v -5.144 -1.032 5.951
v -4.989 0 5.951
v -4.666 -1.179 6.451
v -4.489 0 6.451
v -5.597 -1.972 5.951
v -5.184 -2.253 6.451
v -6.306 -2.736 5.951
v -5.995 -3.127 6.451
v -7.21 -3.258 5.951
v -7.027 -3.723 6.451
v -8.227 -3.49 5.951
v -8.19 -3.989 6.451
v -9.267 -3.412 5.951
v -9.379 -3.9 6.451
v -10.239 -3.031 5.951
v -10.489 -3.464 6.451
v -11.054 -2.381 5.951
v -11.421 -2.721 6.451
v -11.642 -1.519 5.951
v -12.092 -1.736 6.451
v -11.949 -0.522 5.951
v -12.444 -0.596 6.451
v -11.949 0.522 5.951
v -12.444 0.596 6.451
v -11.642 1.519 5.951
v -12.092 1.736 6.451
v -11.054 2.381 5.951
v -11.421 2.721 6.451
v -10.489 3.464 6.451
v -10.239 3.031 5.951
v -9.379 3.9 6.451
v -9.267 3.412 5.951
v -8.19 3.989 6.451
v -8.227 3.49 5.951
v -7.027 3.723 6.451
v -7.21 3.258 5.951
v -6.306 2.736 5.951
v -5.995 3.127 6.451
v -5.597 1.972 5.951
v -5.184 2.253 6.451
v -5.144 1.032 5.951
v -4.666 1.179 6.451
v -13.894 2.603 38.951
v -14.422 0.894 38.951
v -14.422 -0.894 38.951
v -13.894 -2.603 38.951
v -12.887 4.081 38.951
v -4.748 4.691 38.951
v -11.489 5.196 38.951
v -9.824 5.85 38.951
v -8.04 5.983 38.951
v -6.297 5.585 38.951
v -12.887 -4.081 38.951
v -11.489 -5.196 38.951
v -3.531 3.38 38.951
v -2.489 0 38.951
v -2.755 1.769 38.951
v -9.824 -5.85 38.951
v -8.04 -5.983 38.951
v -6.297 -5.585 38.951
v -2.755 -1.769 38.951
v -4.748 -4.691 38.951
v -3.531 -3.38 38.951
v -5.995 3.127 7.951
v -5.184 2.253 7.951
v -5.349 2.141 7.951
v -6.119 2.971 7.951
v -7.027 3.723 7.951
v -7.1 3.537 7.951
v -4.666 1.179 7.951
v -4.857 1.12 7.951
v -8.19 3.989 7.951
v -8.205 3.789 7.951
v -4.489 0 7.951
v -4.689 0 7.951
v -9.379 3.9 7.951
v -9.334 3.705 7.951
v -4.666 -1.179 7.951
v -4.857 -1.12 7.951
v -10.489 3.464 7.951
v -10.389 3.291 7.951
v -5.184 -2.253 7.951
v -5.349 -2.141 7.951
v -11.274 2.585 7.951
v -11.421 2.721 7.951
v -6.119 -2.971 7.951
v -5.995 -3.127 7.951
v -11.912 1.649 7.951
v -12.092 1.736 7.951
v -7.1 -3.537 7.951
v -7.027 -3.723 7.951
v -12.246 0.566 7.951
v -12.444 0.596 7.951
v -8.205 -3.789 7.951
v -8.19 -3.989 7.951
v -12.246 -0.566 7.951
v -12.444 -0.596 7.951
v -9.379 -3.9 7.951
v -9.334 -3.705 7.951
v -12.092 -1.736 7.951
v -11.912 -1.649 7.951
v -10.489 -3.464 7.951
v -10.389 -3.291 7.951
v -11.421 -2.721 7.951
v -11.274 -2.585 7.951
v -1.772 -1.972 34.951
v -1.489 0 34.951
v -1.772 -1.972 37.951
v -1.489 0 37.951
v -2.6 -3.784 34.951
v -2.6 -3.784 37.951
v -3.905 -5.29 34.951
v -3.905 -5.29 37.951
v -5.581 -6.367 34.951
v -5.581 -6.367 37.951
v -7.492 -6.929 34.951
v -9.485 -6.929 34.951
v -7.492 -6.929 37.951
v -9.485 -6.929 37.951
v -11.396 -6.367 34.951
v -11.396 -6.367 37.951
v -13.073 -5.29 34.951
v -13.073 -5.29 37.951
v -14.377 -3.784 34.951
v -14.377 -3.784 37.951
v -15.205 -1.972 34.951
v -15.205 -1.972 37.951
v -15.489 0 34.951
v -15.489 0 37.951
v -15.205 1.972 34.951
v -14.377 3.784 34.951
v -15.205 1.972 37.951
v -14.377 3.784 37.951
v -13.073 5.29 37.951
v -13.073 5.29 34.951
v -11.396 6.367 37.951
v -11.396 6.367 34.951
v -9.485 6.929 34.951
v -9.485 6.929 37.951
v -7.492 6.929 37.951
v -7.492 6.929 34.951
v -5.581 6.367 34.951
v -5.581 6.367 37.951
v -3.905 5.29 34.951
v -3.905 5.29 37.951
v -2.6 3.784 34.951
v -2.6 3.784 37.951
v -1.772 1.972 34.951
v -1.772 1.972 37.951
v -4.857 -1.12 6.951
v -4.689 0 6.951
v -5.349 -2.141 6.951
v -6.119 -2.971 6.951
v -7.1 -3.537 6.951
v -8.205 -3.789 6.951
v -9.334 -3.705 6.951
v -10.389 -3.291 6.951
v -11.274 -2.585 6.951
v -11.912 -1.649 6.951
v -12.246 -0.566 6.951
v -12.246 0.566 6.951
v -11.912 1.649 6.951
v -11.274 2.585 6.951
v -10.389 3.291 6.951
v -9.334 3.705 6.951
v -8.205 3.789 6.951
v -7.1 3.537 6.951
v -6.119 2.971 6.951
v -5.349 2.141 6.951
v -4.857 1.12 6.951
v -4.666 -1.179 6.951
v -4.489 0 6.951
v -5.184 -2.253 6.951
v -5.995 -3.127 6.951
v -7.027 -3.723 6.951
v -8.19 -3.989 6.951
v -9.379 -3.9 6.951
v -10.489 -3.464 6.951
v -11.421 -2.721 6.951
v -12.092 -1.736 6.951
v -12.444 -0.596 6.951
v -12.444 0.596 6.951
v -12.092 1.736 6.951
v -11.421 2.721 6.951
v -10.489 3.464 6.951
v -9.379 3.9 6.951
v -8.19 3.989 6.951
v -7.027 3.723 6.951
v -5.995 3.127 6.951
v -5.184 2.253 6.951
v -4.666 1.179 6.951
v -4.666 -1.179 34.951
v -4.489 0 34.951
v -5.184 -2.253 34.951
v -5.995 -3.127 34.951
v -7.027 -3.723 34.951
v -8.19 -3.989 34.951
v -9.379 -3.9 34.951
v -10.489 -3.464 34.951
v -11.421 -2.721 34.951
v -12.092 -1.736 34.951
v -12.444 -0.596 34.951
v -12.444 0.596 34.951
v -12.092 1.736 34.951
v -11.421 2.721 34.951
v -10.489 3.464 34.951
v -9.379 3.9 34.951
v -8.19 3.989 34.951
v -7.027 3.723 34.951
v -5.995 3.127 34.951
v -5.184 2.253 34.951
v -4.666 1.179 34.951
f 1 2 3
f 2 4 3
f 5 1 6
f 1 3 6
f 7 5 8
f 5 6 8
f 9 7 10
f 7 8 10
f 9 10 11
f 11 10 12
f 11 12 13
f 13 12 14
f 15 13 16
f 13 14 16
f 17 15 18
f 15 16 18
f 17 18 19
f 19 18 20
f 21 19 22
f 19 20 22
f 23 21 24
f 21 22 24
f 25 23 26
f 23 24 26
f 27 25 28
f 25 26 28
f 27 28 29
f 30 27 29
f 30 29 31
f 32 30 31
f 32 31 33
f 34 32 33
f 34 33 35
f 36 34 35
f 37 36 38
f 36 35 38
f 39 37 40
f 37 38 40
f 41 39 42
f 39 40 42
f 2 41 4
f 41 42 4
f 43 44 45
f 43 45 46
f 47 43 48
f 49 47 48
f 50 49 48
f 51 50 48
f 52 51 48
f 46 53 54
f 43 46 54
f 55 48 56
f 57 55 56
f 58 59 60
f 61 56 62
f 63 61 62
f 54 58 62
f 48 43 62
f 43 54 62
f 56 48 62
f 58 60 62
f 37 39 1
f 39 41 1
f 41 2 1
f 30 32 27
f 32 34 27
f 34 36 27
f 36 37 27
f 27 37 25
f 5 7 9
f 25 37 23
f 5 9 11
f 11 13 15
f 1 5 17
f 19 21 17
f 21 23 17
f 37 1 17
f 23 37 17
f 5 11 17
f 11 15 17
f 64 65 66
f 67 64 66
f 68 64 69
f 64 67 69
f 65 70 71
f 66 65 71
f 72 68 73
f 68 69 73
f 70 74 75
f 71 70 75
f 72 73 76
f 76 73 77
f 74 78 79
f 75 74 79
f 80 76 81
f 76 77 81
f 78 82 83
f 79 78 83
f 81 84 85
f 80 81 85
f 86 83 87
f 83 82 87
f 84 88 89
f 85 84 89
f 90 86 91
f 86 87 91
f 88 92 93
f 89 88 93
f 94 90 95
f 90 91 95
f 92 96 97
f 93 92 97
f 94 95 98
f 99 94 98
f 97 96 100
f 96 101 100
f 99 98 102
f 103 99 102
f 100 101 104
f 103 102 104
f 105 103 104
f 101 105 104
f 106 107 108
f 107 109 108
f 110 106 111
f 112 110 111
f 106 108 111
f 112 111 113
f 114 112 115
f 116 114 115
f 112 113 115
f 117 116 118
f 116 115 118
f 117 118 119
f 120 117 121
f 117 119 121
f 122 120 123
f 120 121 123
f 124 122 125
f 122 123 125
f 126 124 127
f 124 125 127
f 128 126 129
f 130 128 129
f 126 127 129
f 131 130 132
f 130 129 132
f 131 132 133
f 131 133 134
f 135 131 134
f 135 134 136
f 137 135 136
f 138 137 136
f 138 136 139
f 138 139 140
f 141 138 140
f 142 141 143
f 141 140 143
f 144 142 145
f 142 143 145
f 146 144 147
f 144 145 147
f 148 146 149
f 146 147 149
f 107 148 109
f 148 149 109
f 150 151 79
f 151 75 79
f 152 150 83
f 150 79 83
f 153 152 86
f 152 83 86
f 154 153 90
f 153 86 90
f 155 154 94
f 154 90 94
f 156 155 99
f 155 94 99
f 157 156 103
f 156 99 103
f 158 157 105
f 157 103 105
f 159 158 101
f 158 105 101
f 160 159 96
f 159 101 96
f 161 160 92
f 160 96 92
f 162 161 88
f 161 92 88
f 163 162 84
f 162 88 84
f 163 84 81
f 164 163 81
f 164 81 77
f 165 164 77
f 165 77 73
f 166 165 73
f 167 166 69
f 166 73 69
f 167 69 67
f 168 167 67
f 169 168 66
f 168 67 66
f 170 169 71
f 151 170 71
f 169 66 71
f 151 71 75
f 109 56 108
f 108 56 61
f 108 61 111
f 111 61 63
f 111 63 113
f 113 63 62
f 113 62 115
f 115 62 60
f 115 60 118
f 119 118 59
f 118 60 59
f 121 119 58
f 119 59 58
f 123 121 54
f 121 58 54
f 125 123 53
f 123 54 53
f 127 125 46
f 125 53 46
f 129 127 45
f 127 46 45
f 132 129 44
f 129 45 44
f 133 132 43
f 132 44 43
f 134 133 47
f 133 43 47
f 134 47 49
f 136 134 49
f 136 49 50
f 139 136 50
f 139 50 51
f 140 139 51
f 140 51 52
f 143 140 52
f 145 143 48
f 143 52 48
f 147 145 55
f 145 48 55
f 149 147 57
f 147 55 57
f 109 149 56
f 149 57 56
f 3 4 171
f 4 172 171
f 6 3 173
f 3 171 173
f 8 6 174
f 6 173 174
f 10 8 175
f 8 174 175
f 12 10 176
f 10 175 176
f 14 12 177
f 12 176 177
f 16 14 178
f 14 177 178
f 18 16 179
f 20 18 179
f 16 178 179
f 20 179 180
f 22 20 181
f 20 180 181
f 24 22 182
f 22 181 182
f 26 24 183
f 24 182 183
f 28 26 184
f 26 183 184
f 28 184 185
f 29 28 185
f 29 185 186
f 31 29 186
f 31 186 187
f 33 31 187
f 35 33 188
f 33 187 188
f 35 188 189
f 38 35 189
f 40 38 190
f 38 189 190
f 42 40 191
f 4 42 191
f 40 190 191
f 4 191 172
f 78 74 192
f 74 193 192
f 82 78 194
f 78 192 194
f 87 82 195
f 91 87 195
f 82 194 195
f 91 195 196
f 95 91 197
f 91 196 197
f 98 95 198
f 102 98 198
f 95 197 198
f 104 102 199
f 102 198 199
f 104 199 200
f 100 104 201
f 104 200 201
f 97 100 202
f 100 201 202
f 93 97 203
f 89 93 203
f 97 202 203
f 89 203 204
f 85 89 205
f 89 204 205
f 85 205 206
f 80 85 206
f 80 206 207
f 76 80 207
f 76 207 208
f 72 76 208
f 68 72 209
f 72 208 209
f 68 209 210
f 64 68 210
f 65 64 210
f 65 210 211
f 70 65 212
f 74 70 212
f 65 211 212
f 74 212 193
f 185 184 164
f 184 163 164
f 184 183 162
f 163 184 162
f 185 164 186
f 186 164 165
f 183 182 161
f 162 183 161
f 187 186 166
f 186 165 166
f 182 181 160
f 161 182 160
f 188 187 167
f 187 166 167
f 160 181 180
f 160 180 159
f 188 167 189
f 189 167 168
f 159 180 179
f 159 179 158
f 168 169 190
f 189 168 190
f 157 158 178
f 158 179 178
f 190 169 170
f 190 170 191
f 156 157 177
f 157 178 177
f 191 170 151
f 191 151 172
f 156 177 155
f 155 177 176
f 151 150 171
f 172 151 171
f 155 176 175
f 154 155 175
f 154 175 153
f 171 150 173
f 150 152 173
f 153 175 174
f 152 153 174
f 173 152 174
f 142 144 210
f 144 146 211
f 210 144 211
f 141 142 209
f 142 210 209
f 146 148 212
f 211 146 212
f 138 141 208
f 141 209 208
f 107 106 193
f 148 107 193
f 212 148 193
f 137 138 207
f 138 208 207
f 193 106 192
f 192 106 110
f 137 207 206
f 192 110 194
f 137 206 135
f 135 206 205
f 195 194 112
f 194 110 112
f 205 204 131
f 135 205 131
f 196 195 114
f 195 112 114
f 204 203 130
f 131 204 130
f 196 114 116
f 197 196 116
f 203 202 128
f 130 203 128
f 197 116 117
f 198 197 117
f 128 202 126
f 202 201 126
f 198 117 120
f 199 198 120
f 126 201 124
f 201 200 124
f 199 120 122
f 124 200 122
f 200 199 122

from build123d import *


with BuildPart() as part:
    # Esquisse3 → Base-Révolution (revolve)
    with BuildSketch(Plane(origin=(0, 0, 0), x_dir=(1, 0, 0), z_dir=(0, 1, 0)), mode=Mode.PRIVATE) as base_r_volution_sk:
        Polygon((-14.488580903, -38.951150448), (-8.488580903, -38.951150448), (-8.488580903, -5.951150448), (-11.988580903, -5.951150448), (-12.488580903, -6.451150448), (-12.488580903, -6.951150448), (-12.288580903, -6.951150448), (-12.288580903, -7.951150448), (-12.488580903, -7.951150448), (-12.488580903, -34.951150448), (-15.488580903, -34.951150448), (-15.488580903, -37.951150448), align=None)
    revolve(base_r_volution_sk.sketch.rotate(Axis((-8.488580903, 0, 56.293331626), (0, 0, -1)), 180), axis=Axis((-8.488580903, 0, 56.293331626), (0, 0, -1)))


solid = part.part
